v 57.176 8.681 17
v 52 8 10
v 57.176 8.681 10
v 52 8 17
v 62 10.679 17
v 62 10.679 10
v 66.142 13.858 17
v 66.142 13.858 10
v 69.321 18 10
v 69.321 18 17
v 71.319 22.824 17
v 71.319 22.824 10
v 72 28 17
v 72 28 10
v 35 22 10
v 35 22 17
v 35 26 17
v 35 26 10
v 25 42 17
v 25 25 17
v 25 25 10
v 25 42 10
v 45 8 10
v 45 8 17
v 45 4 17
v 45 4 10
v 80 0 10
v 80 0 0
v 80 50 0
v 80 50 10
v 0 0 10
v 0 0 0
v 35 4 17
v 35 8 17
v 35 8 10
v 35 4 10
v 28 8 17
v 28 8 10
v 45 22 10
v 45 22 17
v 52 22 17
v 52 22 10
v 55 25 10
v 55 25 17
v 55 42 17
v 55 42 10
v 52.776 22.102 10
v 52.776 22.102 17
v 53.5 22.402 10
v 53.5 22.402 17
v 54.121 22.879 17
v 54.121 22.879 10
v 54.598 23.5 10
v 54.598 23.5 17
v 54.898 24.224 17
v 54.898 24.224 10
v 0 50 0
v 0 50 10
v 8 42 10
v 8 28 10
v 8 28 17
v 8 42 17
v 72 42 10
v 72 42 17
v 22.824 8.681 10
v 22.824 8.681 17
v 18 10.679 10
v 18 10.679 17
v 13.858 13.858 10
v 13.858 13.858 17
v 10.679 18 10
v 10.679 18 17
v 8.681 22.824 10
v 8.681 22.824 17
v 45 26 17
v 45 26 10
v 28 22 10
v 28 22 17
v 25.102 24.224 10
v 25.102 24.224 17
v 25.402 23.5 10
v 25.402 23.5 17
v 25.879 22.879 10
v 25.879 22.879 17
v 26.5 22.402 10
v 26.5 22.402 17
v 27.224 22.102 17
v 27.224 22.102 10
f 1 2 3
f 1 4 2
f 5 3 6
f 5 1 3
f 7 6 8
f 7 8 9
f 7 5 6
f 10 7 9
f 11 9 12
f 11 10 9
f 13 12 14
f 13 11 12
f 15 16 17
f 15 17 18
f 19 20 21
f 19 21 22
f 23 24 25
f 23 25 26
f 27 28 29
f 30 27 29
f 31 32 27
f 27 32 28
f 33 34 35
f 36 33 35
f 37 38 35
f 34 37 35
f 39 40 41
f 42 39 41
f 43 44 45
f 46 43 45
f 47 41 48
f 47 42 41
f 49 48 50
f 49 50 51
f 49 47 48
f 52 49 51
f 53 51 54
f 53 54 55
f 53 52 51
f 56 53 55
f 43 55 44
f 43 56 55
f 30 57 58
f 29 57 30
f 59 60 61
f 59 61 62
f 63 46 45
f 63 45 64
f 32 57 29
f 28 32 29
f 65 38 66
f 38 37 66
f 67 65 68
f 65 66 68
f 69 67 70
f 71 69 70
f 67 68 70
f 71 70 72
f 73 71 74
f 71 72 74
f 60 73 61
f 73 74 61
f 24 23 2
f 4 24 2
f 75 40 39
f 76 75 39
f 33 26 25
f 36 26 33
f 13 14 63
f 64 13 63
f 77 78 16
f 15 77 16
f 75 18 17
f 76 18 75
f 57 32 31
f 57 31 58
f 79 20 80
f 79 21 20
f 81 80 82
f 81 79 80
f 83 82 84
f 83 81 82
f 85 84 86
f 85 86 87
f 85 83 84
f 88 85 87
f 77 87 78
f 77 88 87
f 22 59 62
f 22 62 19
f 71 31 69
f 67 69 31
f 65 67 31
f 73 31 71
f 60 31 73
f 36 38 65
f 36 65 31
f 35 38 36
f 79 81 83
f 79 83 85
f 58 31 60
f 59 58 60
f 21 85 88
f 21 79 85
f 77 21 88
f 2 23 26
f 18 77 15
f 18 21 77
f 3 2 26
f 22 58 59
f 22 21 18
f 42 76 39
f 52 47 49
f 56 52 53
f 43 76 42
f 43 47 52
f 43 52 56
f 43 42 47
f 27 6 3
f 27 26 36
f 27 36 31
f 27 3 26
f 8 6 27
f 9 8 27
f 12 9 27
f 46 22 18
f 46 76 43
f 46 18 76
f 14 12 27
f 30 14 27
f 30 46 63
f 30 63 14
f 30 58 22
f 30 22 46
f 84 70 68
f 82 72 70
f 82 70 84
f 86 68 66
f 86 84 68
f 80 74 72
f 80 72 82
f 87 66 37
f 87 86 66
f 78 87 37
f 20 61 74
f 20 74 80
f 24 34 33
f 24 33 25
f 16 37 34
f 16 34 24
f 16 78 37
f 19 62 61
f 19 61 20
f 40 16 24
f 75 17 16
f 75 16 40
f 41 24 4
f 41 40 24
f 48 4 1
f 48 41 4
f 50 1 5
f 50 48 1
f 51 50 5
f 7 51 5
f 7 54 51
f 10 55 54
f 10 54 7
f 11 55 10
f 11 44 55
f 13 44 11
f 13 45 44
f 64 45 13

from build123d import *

# Parameters (mm, degrees)
SKETCH1_W           = 80
SKETCH1_H           = 50
BOSS_EXTRUDE1_DEPTH = 10
SKETCH2_W           = 64
SKETCH2_H           = 34
BOSS_EXTRUDE2_DEPTH = 7
FILLET1_R           = 20
SKETCH3_W           = 10
SKETCH3_H           = 7
BOSS_EXTRUDE3_DEPTH = 4
SKETCH4_W           = 30
SKETCH4_H           = 20
CUT_EXTRUDE1_DEPTH  = 7
FILLET2_R           = 3
SKETCH5_W           = 10
SKETCH5_H           = 7
BOSS_EXTRUDE4_DEPTH = 4


with BuildPart() as part:
    # Sketch1 → Boss-Extrude1 (new body)
    with BuildSketch(Plane.XY):
        with Locations((40, 25)):
            Rectangle(SKETCH1_W, SKETCH1_H)
    extrude(amount=BOSS_EXTRUDE1_DEPTH)

    # Sketch2 → Boss-Extrude2 (add)
    with BuildSketch(Plane.XY.offset(10)):
        with Locations((40, 25)):
            Rectangle(SKETCH2_W, SKETCH2_H)
    extrude(amount=BOSS_EXTRUDE2_DEPTH)

    # Fillet1
    fillet1_edges = [part.edges().sort_by_distance(p)[0] for p in [
        (8, 8, 13.5),
        (72, 8, 13.5),
    ]]
    fillet(fillet1_edges, radius=FILLET1_R)

    # Sketch3 → Boss-Extrude3 (add)
    with BuildSketch(Plane(origin=(0, 8, 0), x_dir=(-1, 0, 0), z_dir=(0, -1, 0))):
        with Locations((-40, -13.5)):
            Rectangle(SKETCH3_W, SKETCH3_H)
    extrude(amount=BOSS_EXTRUDE3_DEPTH)

    # Sketch4 → Cut-Extrude1 (cut)
    with BuildSketch(Plane.XY.offset(17)):
        with Locations((40, 32)):
            Rectangle(SKETCH4_W, SKETCH4_H)
    extrude(amount=-CUT_EXTRUDE1_DEPTH, mode=Mode.SUBTRACT)

    # Fillet2
    fillet2_edges = [part.edges().sort_by_distance(p)[0] for p in [
        (55, 22, 13.5),
        (25, 22, 13.5),
    ]]
    fillet(fillet2_edges, radius=FILLET2_R)

    # Sketch5 → Boss-Extrude4 (add)
    with BuildSketch(Plane(origin=(0, 22, 0), x_dir=(1, 0, 0), z_dir=(0, 1, 0))):
        with Locations((40, -13.5)):
            Rectangle(SKETCH5_W, SKETCH5_H)
    extrude(amount=BOSS_EXTRUDE4_DEPTH)


solid = part.part
